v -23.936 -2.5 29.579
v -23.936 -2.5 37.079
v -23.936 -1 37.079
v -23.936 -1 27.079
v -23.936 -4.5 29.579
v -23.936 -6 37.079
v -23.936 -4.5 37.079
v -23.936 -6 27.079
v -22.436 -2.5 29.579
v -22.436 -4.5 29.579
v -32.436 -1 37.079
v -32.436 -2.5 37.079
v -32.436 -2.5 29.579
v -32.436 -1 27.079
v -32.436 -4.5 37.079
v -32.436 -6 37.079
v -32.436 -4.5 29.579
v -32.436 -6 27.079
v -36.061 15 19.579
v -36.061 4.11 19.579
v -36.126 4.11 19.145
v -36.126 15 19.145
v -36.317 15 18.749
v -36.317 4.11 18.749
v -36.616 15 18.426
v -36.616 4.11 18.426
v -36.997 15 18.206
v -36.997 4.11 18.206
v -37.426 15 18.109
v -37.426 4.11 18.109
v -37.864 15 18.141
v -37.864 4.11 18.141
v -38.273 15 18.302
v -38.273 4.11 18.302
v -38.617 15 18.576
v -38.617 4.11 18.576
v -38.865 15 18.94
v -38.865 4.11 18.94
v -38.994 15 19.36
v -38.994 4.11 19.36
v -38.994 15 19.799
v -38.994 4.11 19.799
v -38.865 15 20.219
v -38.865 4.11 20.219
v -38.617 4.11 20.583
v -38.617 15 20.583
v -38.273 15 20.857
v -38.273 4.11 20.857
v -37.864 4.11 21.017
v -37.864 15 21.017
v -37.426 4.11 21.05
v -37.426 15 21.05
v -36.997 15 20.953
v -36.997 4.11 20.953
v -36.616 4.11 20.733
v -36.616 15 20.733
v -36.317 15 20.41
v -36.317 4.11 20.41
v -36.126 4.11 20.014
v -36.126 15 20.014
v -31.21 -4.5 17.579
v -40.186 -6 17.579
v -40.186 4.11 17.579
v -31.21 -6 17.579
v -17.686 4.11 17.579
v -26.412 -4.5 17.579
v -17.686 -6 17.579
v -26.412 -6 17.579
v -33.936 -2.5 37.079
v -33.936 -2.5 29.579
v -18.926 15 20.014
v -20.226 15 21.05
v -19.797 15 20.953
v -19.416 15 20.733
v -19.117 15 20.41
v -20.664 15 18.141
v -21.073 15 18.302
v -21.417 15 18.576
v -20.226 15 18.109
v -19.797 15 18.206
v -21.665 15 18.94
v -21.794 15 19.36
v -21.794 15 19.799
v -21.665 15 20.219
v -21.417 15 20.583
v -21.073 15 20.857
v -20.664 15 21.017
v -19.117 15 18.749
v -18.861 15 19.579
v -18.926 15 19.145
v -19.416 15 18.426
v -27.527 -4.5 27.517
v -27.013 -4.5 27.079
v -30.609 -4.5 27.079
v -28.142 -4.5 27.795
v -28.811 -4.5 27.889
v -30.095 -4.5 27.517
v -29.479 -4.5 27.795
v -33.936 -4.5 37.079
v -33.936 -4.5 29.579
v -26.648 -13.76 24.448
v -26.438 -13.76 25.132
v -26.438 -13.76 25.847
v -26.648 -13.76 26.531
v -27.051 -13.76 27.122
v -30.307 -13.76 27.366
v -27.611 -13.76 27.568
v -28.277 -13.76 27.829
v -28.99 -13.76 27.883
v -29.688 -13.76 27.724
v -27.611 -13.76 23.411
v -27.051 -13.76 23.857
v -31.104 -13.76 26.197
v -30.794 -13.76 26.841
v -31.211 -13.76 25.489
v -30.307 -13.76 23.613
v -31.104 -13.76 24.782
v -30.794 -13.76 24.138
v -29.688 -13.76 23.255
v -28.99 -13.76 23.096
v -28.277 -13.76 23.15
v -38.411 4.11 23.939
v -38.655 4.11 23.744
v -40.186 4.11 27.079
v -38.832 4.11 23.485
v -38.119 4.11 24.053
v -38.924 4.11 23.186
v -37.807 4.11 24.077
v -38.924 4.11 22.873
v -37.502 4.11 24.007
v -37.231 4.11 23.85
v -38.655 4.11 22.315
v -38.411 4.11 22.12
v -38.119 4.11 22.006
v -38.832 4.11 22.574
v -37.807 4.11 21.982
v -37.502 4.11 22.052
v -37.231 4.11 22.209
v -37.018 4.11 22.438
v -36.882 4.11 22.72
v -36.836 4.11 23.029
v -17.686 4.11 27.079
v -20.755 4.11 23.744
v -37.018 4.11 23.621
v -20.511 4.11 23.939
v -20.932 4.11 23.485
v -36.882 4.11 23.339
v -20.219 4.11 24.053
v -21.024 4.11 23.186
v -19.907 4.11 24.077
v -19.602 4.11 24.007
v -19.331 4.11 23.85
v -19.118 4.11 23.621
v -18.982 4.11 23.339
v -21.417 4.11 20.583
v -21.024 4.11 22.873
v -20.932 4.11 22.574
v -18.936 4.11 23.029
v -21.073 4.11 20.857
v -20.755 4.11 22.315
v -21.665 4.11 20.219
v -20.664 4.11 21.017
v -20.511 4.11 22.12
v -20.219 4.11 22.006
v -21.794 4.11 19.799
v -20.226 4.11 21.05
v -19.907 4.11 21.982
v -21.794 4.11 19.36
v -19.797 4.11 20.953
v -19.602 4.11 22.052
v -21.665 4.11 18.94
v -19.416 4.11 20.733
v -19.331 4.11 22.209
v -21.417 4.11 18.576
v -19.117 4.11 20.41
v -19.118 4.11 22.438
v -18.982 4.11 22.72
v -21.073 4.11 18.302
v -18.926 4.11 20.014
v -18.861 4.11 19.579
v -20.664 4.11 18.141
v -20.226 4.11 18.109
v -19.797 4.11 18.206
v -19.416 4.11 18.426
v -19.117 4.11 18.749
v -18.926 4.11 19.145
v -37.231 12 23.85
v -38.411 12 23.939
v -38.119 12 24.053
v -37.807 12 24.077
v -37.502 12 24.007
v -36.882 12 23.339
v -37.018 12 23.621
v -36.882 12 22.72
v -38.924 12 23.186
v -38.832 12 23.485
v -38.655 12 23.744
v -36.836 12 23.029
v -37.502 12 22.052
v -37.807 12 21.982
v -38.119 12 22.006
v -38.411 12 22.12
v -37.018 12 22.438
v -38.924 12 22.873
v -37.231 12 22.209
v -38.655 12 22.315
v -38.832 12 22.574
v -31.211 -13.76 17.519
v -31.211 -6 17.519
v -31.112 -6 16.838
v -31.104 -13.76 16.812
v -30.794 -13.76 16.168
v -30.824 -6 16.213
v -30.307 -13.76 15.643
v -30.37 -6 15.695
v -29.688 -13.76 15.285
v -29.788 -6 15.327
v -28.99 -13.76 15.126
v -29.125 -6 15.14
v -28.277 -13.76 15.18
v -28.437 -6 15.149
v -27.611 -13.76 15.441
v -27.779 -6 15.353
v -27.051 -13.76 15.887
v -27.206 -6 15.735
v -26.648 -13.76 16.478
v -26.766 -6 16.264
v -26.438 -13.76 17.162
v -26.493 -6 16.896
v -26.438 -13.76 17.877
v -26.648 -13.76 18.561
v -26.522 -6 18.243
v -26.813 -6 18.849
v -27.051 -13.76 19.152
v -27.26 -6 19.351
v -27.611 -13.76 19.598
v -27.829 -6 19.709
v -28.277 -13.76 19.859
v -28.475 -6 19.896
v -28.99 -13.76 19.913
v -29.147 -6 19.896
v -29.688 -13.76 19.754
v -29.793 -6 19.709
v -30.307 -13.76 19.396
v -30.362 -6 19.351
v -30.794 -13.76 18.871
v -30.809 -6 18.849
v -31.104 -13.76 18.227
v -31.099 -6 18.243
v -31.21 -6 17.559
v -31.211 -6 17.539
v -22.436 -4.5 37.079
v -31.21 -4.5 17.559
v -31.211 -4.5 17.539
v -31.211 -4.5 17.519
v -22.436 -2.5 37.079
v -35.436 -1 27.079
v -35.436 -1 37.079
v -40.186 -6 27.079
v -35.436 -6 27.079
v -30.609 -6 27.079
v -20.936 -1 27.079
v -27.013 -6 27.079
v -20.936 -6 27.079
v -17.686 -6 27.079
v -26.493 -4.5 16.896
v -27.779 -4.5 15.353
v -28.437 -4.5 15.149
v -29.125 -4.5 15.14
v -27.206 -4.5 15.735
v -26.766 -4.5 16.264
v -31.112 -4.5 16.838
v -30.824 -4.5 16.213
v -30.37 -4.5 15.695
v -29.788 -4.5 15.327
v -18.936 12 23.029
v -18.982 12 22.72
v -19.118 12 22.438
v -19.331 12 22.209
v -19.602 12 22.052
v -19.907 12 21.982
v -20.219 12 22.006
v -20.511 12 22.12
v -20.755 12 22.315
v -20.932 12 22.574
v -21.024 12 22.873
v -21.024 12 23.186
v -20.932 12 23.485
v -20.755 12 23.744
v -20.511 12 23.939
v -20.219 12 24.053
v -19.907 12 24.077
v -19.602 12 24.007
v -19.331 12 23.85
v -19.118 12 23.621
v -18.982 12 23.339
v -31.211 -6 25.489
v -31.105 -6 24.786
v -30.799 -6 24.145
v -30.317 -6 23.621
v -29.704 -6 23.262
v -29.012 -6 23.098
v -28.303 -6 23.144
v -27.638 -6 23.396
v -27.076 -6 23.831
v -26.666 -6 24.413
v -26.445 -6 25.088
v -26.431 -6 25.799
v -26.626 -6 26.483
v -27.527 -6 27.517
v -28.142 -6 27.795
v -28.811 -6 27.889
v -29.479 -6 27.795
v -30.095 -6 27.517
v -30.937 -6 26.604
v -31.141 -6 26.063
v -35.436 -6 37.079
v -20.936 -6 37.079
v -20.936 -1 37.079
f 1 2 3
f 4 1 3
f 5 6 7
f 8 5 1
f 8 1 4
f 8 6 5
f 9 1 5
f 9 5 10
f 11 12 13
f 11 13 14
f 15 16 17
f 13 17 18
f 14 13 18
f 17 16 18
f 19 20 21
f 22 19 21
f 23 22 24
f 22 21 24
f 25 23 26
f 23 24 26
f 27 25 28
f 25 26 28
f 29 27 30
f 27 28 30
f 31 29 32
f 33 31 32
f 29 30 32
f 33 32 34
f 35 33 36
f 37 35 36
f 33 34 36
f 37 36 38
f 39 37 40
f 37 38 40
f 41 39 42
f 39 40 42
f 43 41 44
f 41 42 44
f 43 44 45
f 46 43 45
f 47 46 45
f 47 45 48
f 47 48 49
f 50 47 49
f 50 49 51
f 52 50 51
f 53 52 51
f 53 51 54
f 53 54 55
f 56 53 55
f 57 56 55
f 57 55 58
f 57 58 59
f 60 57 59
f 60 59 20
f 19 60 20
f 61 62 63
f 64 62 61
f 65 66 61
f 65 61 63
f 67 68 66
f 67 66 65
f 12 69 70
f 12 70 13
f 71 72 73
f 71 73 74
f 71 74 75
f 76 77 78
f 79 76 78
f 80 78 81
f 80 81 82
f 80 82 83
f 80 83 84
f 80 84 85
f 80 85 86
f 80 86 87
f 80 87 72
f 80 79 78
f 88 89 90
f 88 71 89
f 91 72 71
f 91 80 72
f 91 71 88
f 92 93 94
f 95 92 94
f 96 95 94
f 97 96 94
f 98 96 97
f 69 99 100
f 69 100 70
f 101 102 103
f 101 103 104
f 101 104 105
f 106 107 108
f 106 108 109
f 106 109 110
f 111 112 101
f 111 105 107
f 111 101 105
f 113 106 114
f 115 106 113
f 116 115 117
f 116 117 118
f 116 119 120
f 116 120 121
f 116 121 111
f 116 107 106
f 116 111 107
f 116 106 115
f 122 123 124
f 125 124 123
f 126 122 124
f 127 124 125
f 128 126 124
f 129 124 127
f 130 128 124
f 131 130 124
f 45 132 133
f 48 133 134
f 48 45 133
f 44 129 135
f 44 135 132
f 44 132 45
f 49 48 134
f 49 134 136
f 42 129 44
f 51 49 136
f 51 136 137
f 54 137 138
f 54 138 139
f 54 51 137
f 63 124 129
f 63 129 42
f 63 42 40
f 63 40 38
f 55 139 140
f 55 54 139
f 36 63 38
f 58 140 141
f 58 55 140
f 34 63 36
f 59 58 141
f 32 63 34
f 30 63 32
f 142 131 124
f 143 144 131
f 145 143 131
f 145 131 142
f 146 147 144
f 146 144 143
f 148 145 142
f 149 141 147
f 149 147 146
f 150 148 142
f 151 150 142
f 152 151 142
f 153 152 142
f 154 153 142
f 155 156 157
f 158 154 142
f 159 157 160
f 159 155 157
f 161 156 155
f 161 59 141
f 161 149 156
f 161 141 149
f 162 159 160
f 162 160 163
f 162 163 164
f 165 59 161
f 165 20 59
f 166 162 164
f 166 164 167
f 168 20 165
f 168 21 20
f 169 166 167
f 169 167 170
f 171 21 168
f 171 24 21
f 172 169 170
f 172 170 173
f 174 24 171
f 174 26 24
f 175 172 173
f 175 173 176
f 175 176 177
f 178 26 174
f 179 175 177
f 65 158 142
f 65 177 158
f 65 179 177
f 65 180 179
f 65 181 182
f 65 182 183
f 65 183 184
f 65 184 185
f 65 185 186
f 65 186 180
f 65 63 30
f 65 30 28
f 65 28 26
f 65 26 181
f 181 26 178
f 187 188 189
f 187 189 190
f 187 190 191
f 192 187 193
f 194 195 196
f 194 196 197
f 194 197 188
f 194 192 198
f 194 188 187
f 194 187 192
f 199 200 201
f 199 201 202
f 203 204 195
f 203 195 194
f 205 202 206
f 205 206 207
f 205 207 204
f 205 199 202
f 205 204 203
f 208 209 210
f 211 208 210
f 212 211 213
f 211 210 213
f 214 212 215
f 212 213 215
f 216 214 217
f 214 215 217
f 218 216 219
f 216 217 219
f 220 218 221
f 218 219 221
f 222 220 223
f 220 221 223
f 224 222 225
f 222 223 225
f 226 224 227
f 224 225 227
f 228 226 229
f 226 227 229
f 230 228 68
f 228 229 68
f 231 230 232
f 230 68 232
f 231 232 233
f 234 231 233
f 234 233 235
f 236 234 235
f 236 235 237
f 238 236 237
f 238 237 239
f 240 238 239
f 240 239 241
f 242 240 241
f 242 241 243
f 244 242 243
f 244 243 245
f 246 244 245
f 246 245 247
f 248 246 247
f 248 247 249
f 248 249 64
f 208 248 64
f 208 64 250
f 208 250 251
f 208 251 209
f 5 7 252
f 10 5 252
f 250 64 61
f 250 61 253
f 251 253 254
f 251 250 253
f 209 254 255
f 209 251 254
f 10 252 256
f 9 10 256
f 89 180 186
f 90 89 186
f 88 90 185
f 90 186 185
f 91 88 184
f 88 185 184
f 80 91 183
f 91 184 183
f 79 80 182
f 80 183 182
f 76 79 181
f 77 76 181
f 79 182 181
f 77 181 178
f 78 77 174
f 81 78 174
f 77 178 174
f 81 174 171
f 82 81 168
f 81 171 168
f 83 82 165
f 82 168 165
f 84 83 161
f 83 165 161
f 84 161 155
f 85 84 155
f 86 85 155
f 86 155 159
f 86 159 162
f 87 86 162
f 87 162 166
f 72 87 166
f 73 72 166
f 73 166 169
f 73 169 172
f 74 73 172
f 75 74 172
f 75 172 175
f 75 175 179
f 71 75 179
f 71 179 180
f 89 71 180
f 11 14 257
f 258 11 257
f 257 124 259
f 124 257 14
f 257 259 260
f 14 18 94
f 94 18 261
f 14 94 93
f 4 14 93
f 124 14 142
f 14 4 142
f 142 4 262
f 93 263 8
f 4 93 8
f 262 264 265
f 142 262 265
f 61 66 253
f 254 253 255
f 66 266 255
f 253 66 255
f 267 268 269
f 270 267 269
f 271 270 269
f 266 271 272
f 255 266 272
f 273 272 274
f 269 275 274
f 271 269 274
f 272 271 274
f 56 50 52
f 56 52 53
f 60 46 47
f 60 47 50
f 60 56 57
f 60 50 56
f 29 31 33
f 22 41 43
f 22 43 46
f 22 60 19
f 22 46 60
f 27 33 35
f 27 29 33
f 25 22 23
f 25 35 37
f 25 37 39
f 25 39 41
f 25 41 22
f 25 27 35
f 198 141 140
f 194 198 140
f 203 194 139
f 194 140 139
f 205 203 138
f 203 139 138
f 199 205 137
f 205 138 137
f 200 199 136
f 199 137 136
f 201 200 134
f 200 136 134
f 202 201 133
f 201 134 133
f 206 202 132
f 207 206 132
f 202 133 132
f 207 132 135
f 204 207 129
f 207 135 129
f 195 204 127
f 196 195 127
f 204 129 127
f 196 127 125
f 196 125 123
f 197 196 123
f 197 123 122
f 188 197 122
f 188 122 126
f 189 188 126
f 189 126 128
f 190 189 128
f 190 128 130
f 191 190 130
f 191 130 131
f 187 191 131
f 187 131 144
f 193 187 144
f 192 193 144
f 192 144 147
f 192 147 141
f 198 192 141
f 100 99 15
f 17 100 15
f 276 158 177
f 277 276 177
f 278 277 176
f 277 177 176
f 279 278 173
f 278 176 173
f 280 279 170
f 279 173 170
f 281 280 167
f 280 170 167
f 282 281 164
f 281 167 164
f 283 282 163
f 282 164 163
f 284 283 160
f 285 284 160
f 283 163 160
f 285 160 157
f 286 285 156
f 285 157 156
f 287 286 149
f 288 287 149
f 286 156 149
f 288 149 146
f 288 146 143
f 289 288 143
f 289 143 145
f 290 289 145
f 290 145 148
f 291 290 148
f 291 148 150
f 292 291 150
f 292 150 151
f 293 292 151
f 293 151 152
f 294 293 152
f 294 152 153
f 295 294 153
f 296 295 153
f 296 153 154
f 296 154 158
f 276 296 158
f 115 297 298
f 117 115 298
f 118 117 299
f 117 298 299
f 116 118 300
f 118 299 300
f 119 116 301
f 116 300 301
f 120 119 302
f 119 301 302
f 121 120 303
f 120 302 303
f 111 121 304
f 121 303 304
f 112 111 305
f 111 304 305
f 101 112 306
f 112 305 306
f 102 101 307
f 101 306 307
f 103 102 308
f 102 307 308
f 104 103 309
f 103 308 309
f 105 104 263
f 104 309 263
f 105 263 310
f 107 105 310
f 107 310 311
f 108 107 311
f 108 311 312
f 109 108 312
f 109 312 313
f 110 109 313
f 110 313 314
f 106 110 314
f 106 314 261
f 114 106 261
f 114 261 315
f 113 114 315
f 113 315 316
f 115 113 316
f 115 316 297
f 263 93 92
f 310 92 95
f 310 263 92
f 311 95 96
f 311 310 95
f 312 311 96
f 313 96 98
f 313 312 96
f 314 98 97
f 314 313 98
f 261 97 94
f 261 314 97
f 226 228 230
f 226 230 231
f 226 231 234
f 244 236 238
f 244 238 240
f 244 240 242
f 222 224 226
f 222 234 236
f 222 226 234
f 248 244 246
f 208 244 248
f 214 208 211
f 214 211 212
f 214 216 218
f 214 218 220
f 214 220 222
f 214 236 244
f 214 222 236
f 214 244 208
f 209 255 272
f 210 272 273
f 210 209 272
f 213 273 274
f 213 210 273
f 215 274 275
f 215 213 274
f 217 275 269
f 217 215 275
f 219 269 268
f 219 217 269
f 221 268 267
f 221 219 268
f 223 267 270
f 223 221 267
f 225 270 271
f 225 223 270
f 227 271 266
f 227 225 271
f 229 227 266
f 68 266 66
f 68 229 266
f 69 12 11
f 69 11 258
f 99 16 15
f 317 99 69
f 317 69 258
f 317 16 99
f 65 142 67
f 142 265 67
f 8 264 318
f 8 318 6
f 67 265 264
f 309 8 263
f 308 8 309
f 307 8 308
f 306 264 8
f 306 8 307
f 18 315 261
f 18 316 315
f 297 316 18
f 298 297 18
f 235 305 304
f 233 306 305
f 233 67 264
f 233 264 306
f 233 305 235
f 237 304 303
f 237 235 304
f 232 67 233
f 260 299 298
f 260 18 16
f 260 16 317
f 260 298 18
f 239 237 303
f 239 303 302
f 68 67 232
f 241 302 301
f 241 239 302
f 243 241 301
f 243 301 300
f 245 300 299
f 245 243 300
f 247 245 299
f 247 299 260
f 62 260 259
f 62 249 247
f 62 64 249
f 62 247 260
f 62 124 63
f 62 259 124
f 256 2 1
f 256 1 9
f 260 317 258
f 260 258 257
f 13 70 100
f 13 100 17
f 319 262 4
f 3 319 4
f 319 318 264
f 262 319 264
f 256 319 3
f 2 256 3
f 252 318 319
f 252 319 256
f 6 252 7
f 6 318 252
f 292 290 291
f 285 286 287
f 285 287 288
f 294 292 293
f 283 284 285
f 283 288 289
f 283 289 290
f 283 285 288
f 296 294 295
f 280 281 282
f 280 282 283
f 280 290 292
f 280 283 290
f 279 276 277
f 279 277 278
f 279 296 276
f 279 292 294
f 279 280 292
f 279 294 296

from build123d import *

# Parameters (mm, degrees)
SKETCH1_W                = 22.5
SKETCH1_H                = 7
BOSS_EXTRUDE1_DEPTH      = 1.5
SKETCH2_R                = 1.475
BOSS_EXTRUDE2_DEPTH      = 13.5
SKETCH3_R                = 1.05
BOSS_EXTRUDE3_DEPTH      = 10.5
SKETCH4_W                = 22.5
SKETCH4_H                = 2.5
SKETCH4_H_2              = 7
BOSS_EXTRUDE4_DEPTH      = 6
BOSS_EXTRUDE4_DEPTH_BACK = 1.5
SKETCH5_W                = 3
SKETCH5_H                = 10
BOSS_EXTRUDE6_DEPTH      = 5
SKETCH7_W                = 11.5
SKETCH7_H                = 2
CUT_EXTRUDE1_DEPTH       = 7.5
SKETCH8_W                = 22.5
SKETCH8_H                = 9.5
BOSS_EXTRUDE7_DEPTH      = 2.61
SKETCH9_R                = 2.4
BOSS_EXTRUDE8_DEPTH      = 7.76
BOSS_EXTRUDE8_DEPTH_BACK = 1.5


with BuildPart() as part:
    # Sketch1 → Boss-Extrude1 (new body)
    with BuildSketch(Plane(origin=(0, 0, 0), x_dir=(1, 0, 0), z_dir=(0, 1, 0))):
        with Locations((-28.93578967, -21.079480712)):
            Rectangle(SKETCH1_W, SKETCH1_H)
    extrude(amount=BOSS_EXTRUDE1_DEPTH)

    # Sketch2 → Boss-Extrude2 (add)
    with BuildSketch(Plane(origin=(0, 1.5, 0), x_dir=(1, 0, 0), z_dir=(0, 1, 0))):
        with Locations((-37.53578967, -19.579480712)):
            Circle(SKETCH2_R)
        with Locations((-20.33578967, -19.579480712)):
            Circle(SKETCH2_R)
    extrude(amount=BOSS_EXTRUDE2_DEPTH)

    # Sketch3 → Boss-Extrude3 (add)
    with BuildSketch(Plane(origin=(0, 1.5, 0), x_dir=(1, 0, 0), z_dir=(0, 1, 0))):
        with Locations((-37.88578967, -23.029480712)):
            Circle(SKETCH3_R)
        with Locations((-19.98578967, -23.029480712)):
            Circle(SKETCH3_R)
    extrude(amount=BOSS_EXTRUDE3_DEPTH)

    # Sketch4 → Boss-Extrude4 (add, two sides)
    with BuildSketch(Plane(origin=(0, 0, 0), x_dir=(-1, 0, 0), z_dir=(0, -1, 0))) as boss_extrude4_sk:
        with Locations((28.93578967, -25.829480712)):
            Rectangle(SKETCH4_W, SKETCH4_H)
        with Locations((28.93578967, -21.079480712)):
            Rectangle(SKETCH4_W, SKETCH4_H_2)
    extrude(amount=BOSS_EXTRUDE4_DEPTH)
    extrude(boss_extrude4_sk.sketch, amount=-BOSS_EXTRUDE4_DEPTH_BACK)

    # Sketch5 → Boss-Extrude6 (add)
    with BuildSketch(Plane(origin=(0, -6, 0), x_dir=(-1, 0, 0), z_dir=(0, -1, 0))):
        with Locations((33.93578967, -32.079480712)):
            Rectangle(SKETCH5_W, SKETCH5_H)
        with Locations((22.43578967, -32.079480712)):
            Rectangle(SKETCH5_W, SKETCH5_H)
    extrude(amount=-BOSS_EXTRUDE6_DEPTH)

    # Sketch7 → Cut-Extrude1 (cut)
    with BuildSketch(Plane.XY.offset(37.079480712)):
        with Locations((-28.18578967, -3.5)):
            Rectangle(SKETCH7_W, SKETCH7_H)
    extrude(amount=-CUT_EXTRUDE1_DEPTH, mode=Mode.SUBTRACT)

    # Sketch8 → Boss-Extrude7 (add)
    with BuildSketch(Plane(origin=(0, 1.5, 0), x_dir=(1, 0, 0), z_dir=(0, 1, 0))):
        with Locations((-28.93578967, -22.329480712)):
            Rectangle(SKETCH8_W, SKETCH8_H)
    extrude(amount=BOSS_EXTRUDE7_DEPTH)

    # Sketch9 → Boss-Extrude8 (add, two sides)
    with BuildSketch(Plane(origin=(0, -6, 0), x_dir=(-1, 0, 0), z_dir=(0, -1, 0))) as boss_extrude8_sk:
        with Locations((28.81078967, -25.489480712)):
            Circle(SKETCH9_R)
        with Locations((28.81078967, -17.519480712)):
            Circle(SKETCH9_R)
    extrude(amount=BOSS_EXTRUDE8_DEPTH)
    extrude(boss_extrude8_sk.sketch, amount=-BOSS_EXTRUDE8_DEPTH_BACK)


solid = part.part
